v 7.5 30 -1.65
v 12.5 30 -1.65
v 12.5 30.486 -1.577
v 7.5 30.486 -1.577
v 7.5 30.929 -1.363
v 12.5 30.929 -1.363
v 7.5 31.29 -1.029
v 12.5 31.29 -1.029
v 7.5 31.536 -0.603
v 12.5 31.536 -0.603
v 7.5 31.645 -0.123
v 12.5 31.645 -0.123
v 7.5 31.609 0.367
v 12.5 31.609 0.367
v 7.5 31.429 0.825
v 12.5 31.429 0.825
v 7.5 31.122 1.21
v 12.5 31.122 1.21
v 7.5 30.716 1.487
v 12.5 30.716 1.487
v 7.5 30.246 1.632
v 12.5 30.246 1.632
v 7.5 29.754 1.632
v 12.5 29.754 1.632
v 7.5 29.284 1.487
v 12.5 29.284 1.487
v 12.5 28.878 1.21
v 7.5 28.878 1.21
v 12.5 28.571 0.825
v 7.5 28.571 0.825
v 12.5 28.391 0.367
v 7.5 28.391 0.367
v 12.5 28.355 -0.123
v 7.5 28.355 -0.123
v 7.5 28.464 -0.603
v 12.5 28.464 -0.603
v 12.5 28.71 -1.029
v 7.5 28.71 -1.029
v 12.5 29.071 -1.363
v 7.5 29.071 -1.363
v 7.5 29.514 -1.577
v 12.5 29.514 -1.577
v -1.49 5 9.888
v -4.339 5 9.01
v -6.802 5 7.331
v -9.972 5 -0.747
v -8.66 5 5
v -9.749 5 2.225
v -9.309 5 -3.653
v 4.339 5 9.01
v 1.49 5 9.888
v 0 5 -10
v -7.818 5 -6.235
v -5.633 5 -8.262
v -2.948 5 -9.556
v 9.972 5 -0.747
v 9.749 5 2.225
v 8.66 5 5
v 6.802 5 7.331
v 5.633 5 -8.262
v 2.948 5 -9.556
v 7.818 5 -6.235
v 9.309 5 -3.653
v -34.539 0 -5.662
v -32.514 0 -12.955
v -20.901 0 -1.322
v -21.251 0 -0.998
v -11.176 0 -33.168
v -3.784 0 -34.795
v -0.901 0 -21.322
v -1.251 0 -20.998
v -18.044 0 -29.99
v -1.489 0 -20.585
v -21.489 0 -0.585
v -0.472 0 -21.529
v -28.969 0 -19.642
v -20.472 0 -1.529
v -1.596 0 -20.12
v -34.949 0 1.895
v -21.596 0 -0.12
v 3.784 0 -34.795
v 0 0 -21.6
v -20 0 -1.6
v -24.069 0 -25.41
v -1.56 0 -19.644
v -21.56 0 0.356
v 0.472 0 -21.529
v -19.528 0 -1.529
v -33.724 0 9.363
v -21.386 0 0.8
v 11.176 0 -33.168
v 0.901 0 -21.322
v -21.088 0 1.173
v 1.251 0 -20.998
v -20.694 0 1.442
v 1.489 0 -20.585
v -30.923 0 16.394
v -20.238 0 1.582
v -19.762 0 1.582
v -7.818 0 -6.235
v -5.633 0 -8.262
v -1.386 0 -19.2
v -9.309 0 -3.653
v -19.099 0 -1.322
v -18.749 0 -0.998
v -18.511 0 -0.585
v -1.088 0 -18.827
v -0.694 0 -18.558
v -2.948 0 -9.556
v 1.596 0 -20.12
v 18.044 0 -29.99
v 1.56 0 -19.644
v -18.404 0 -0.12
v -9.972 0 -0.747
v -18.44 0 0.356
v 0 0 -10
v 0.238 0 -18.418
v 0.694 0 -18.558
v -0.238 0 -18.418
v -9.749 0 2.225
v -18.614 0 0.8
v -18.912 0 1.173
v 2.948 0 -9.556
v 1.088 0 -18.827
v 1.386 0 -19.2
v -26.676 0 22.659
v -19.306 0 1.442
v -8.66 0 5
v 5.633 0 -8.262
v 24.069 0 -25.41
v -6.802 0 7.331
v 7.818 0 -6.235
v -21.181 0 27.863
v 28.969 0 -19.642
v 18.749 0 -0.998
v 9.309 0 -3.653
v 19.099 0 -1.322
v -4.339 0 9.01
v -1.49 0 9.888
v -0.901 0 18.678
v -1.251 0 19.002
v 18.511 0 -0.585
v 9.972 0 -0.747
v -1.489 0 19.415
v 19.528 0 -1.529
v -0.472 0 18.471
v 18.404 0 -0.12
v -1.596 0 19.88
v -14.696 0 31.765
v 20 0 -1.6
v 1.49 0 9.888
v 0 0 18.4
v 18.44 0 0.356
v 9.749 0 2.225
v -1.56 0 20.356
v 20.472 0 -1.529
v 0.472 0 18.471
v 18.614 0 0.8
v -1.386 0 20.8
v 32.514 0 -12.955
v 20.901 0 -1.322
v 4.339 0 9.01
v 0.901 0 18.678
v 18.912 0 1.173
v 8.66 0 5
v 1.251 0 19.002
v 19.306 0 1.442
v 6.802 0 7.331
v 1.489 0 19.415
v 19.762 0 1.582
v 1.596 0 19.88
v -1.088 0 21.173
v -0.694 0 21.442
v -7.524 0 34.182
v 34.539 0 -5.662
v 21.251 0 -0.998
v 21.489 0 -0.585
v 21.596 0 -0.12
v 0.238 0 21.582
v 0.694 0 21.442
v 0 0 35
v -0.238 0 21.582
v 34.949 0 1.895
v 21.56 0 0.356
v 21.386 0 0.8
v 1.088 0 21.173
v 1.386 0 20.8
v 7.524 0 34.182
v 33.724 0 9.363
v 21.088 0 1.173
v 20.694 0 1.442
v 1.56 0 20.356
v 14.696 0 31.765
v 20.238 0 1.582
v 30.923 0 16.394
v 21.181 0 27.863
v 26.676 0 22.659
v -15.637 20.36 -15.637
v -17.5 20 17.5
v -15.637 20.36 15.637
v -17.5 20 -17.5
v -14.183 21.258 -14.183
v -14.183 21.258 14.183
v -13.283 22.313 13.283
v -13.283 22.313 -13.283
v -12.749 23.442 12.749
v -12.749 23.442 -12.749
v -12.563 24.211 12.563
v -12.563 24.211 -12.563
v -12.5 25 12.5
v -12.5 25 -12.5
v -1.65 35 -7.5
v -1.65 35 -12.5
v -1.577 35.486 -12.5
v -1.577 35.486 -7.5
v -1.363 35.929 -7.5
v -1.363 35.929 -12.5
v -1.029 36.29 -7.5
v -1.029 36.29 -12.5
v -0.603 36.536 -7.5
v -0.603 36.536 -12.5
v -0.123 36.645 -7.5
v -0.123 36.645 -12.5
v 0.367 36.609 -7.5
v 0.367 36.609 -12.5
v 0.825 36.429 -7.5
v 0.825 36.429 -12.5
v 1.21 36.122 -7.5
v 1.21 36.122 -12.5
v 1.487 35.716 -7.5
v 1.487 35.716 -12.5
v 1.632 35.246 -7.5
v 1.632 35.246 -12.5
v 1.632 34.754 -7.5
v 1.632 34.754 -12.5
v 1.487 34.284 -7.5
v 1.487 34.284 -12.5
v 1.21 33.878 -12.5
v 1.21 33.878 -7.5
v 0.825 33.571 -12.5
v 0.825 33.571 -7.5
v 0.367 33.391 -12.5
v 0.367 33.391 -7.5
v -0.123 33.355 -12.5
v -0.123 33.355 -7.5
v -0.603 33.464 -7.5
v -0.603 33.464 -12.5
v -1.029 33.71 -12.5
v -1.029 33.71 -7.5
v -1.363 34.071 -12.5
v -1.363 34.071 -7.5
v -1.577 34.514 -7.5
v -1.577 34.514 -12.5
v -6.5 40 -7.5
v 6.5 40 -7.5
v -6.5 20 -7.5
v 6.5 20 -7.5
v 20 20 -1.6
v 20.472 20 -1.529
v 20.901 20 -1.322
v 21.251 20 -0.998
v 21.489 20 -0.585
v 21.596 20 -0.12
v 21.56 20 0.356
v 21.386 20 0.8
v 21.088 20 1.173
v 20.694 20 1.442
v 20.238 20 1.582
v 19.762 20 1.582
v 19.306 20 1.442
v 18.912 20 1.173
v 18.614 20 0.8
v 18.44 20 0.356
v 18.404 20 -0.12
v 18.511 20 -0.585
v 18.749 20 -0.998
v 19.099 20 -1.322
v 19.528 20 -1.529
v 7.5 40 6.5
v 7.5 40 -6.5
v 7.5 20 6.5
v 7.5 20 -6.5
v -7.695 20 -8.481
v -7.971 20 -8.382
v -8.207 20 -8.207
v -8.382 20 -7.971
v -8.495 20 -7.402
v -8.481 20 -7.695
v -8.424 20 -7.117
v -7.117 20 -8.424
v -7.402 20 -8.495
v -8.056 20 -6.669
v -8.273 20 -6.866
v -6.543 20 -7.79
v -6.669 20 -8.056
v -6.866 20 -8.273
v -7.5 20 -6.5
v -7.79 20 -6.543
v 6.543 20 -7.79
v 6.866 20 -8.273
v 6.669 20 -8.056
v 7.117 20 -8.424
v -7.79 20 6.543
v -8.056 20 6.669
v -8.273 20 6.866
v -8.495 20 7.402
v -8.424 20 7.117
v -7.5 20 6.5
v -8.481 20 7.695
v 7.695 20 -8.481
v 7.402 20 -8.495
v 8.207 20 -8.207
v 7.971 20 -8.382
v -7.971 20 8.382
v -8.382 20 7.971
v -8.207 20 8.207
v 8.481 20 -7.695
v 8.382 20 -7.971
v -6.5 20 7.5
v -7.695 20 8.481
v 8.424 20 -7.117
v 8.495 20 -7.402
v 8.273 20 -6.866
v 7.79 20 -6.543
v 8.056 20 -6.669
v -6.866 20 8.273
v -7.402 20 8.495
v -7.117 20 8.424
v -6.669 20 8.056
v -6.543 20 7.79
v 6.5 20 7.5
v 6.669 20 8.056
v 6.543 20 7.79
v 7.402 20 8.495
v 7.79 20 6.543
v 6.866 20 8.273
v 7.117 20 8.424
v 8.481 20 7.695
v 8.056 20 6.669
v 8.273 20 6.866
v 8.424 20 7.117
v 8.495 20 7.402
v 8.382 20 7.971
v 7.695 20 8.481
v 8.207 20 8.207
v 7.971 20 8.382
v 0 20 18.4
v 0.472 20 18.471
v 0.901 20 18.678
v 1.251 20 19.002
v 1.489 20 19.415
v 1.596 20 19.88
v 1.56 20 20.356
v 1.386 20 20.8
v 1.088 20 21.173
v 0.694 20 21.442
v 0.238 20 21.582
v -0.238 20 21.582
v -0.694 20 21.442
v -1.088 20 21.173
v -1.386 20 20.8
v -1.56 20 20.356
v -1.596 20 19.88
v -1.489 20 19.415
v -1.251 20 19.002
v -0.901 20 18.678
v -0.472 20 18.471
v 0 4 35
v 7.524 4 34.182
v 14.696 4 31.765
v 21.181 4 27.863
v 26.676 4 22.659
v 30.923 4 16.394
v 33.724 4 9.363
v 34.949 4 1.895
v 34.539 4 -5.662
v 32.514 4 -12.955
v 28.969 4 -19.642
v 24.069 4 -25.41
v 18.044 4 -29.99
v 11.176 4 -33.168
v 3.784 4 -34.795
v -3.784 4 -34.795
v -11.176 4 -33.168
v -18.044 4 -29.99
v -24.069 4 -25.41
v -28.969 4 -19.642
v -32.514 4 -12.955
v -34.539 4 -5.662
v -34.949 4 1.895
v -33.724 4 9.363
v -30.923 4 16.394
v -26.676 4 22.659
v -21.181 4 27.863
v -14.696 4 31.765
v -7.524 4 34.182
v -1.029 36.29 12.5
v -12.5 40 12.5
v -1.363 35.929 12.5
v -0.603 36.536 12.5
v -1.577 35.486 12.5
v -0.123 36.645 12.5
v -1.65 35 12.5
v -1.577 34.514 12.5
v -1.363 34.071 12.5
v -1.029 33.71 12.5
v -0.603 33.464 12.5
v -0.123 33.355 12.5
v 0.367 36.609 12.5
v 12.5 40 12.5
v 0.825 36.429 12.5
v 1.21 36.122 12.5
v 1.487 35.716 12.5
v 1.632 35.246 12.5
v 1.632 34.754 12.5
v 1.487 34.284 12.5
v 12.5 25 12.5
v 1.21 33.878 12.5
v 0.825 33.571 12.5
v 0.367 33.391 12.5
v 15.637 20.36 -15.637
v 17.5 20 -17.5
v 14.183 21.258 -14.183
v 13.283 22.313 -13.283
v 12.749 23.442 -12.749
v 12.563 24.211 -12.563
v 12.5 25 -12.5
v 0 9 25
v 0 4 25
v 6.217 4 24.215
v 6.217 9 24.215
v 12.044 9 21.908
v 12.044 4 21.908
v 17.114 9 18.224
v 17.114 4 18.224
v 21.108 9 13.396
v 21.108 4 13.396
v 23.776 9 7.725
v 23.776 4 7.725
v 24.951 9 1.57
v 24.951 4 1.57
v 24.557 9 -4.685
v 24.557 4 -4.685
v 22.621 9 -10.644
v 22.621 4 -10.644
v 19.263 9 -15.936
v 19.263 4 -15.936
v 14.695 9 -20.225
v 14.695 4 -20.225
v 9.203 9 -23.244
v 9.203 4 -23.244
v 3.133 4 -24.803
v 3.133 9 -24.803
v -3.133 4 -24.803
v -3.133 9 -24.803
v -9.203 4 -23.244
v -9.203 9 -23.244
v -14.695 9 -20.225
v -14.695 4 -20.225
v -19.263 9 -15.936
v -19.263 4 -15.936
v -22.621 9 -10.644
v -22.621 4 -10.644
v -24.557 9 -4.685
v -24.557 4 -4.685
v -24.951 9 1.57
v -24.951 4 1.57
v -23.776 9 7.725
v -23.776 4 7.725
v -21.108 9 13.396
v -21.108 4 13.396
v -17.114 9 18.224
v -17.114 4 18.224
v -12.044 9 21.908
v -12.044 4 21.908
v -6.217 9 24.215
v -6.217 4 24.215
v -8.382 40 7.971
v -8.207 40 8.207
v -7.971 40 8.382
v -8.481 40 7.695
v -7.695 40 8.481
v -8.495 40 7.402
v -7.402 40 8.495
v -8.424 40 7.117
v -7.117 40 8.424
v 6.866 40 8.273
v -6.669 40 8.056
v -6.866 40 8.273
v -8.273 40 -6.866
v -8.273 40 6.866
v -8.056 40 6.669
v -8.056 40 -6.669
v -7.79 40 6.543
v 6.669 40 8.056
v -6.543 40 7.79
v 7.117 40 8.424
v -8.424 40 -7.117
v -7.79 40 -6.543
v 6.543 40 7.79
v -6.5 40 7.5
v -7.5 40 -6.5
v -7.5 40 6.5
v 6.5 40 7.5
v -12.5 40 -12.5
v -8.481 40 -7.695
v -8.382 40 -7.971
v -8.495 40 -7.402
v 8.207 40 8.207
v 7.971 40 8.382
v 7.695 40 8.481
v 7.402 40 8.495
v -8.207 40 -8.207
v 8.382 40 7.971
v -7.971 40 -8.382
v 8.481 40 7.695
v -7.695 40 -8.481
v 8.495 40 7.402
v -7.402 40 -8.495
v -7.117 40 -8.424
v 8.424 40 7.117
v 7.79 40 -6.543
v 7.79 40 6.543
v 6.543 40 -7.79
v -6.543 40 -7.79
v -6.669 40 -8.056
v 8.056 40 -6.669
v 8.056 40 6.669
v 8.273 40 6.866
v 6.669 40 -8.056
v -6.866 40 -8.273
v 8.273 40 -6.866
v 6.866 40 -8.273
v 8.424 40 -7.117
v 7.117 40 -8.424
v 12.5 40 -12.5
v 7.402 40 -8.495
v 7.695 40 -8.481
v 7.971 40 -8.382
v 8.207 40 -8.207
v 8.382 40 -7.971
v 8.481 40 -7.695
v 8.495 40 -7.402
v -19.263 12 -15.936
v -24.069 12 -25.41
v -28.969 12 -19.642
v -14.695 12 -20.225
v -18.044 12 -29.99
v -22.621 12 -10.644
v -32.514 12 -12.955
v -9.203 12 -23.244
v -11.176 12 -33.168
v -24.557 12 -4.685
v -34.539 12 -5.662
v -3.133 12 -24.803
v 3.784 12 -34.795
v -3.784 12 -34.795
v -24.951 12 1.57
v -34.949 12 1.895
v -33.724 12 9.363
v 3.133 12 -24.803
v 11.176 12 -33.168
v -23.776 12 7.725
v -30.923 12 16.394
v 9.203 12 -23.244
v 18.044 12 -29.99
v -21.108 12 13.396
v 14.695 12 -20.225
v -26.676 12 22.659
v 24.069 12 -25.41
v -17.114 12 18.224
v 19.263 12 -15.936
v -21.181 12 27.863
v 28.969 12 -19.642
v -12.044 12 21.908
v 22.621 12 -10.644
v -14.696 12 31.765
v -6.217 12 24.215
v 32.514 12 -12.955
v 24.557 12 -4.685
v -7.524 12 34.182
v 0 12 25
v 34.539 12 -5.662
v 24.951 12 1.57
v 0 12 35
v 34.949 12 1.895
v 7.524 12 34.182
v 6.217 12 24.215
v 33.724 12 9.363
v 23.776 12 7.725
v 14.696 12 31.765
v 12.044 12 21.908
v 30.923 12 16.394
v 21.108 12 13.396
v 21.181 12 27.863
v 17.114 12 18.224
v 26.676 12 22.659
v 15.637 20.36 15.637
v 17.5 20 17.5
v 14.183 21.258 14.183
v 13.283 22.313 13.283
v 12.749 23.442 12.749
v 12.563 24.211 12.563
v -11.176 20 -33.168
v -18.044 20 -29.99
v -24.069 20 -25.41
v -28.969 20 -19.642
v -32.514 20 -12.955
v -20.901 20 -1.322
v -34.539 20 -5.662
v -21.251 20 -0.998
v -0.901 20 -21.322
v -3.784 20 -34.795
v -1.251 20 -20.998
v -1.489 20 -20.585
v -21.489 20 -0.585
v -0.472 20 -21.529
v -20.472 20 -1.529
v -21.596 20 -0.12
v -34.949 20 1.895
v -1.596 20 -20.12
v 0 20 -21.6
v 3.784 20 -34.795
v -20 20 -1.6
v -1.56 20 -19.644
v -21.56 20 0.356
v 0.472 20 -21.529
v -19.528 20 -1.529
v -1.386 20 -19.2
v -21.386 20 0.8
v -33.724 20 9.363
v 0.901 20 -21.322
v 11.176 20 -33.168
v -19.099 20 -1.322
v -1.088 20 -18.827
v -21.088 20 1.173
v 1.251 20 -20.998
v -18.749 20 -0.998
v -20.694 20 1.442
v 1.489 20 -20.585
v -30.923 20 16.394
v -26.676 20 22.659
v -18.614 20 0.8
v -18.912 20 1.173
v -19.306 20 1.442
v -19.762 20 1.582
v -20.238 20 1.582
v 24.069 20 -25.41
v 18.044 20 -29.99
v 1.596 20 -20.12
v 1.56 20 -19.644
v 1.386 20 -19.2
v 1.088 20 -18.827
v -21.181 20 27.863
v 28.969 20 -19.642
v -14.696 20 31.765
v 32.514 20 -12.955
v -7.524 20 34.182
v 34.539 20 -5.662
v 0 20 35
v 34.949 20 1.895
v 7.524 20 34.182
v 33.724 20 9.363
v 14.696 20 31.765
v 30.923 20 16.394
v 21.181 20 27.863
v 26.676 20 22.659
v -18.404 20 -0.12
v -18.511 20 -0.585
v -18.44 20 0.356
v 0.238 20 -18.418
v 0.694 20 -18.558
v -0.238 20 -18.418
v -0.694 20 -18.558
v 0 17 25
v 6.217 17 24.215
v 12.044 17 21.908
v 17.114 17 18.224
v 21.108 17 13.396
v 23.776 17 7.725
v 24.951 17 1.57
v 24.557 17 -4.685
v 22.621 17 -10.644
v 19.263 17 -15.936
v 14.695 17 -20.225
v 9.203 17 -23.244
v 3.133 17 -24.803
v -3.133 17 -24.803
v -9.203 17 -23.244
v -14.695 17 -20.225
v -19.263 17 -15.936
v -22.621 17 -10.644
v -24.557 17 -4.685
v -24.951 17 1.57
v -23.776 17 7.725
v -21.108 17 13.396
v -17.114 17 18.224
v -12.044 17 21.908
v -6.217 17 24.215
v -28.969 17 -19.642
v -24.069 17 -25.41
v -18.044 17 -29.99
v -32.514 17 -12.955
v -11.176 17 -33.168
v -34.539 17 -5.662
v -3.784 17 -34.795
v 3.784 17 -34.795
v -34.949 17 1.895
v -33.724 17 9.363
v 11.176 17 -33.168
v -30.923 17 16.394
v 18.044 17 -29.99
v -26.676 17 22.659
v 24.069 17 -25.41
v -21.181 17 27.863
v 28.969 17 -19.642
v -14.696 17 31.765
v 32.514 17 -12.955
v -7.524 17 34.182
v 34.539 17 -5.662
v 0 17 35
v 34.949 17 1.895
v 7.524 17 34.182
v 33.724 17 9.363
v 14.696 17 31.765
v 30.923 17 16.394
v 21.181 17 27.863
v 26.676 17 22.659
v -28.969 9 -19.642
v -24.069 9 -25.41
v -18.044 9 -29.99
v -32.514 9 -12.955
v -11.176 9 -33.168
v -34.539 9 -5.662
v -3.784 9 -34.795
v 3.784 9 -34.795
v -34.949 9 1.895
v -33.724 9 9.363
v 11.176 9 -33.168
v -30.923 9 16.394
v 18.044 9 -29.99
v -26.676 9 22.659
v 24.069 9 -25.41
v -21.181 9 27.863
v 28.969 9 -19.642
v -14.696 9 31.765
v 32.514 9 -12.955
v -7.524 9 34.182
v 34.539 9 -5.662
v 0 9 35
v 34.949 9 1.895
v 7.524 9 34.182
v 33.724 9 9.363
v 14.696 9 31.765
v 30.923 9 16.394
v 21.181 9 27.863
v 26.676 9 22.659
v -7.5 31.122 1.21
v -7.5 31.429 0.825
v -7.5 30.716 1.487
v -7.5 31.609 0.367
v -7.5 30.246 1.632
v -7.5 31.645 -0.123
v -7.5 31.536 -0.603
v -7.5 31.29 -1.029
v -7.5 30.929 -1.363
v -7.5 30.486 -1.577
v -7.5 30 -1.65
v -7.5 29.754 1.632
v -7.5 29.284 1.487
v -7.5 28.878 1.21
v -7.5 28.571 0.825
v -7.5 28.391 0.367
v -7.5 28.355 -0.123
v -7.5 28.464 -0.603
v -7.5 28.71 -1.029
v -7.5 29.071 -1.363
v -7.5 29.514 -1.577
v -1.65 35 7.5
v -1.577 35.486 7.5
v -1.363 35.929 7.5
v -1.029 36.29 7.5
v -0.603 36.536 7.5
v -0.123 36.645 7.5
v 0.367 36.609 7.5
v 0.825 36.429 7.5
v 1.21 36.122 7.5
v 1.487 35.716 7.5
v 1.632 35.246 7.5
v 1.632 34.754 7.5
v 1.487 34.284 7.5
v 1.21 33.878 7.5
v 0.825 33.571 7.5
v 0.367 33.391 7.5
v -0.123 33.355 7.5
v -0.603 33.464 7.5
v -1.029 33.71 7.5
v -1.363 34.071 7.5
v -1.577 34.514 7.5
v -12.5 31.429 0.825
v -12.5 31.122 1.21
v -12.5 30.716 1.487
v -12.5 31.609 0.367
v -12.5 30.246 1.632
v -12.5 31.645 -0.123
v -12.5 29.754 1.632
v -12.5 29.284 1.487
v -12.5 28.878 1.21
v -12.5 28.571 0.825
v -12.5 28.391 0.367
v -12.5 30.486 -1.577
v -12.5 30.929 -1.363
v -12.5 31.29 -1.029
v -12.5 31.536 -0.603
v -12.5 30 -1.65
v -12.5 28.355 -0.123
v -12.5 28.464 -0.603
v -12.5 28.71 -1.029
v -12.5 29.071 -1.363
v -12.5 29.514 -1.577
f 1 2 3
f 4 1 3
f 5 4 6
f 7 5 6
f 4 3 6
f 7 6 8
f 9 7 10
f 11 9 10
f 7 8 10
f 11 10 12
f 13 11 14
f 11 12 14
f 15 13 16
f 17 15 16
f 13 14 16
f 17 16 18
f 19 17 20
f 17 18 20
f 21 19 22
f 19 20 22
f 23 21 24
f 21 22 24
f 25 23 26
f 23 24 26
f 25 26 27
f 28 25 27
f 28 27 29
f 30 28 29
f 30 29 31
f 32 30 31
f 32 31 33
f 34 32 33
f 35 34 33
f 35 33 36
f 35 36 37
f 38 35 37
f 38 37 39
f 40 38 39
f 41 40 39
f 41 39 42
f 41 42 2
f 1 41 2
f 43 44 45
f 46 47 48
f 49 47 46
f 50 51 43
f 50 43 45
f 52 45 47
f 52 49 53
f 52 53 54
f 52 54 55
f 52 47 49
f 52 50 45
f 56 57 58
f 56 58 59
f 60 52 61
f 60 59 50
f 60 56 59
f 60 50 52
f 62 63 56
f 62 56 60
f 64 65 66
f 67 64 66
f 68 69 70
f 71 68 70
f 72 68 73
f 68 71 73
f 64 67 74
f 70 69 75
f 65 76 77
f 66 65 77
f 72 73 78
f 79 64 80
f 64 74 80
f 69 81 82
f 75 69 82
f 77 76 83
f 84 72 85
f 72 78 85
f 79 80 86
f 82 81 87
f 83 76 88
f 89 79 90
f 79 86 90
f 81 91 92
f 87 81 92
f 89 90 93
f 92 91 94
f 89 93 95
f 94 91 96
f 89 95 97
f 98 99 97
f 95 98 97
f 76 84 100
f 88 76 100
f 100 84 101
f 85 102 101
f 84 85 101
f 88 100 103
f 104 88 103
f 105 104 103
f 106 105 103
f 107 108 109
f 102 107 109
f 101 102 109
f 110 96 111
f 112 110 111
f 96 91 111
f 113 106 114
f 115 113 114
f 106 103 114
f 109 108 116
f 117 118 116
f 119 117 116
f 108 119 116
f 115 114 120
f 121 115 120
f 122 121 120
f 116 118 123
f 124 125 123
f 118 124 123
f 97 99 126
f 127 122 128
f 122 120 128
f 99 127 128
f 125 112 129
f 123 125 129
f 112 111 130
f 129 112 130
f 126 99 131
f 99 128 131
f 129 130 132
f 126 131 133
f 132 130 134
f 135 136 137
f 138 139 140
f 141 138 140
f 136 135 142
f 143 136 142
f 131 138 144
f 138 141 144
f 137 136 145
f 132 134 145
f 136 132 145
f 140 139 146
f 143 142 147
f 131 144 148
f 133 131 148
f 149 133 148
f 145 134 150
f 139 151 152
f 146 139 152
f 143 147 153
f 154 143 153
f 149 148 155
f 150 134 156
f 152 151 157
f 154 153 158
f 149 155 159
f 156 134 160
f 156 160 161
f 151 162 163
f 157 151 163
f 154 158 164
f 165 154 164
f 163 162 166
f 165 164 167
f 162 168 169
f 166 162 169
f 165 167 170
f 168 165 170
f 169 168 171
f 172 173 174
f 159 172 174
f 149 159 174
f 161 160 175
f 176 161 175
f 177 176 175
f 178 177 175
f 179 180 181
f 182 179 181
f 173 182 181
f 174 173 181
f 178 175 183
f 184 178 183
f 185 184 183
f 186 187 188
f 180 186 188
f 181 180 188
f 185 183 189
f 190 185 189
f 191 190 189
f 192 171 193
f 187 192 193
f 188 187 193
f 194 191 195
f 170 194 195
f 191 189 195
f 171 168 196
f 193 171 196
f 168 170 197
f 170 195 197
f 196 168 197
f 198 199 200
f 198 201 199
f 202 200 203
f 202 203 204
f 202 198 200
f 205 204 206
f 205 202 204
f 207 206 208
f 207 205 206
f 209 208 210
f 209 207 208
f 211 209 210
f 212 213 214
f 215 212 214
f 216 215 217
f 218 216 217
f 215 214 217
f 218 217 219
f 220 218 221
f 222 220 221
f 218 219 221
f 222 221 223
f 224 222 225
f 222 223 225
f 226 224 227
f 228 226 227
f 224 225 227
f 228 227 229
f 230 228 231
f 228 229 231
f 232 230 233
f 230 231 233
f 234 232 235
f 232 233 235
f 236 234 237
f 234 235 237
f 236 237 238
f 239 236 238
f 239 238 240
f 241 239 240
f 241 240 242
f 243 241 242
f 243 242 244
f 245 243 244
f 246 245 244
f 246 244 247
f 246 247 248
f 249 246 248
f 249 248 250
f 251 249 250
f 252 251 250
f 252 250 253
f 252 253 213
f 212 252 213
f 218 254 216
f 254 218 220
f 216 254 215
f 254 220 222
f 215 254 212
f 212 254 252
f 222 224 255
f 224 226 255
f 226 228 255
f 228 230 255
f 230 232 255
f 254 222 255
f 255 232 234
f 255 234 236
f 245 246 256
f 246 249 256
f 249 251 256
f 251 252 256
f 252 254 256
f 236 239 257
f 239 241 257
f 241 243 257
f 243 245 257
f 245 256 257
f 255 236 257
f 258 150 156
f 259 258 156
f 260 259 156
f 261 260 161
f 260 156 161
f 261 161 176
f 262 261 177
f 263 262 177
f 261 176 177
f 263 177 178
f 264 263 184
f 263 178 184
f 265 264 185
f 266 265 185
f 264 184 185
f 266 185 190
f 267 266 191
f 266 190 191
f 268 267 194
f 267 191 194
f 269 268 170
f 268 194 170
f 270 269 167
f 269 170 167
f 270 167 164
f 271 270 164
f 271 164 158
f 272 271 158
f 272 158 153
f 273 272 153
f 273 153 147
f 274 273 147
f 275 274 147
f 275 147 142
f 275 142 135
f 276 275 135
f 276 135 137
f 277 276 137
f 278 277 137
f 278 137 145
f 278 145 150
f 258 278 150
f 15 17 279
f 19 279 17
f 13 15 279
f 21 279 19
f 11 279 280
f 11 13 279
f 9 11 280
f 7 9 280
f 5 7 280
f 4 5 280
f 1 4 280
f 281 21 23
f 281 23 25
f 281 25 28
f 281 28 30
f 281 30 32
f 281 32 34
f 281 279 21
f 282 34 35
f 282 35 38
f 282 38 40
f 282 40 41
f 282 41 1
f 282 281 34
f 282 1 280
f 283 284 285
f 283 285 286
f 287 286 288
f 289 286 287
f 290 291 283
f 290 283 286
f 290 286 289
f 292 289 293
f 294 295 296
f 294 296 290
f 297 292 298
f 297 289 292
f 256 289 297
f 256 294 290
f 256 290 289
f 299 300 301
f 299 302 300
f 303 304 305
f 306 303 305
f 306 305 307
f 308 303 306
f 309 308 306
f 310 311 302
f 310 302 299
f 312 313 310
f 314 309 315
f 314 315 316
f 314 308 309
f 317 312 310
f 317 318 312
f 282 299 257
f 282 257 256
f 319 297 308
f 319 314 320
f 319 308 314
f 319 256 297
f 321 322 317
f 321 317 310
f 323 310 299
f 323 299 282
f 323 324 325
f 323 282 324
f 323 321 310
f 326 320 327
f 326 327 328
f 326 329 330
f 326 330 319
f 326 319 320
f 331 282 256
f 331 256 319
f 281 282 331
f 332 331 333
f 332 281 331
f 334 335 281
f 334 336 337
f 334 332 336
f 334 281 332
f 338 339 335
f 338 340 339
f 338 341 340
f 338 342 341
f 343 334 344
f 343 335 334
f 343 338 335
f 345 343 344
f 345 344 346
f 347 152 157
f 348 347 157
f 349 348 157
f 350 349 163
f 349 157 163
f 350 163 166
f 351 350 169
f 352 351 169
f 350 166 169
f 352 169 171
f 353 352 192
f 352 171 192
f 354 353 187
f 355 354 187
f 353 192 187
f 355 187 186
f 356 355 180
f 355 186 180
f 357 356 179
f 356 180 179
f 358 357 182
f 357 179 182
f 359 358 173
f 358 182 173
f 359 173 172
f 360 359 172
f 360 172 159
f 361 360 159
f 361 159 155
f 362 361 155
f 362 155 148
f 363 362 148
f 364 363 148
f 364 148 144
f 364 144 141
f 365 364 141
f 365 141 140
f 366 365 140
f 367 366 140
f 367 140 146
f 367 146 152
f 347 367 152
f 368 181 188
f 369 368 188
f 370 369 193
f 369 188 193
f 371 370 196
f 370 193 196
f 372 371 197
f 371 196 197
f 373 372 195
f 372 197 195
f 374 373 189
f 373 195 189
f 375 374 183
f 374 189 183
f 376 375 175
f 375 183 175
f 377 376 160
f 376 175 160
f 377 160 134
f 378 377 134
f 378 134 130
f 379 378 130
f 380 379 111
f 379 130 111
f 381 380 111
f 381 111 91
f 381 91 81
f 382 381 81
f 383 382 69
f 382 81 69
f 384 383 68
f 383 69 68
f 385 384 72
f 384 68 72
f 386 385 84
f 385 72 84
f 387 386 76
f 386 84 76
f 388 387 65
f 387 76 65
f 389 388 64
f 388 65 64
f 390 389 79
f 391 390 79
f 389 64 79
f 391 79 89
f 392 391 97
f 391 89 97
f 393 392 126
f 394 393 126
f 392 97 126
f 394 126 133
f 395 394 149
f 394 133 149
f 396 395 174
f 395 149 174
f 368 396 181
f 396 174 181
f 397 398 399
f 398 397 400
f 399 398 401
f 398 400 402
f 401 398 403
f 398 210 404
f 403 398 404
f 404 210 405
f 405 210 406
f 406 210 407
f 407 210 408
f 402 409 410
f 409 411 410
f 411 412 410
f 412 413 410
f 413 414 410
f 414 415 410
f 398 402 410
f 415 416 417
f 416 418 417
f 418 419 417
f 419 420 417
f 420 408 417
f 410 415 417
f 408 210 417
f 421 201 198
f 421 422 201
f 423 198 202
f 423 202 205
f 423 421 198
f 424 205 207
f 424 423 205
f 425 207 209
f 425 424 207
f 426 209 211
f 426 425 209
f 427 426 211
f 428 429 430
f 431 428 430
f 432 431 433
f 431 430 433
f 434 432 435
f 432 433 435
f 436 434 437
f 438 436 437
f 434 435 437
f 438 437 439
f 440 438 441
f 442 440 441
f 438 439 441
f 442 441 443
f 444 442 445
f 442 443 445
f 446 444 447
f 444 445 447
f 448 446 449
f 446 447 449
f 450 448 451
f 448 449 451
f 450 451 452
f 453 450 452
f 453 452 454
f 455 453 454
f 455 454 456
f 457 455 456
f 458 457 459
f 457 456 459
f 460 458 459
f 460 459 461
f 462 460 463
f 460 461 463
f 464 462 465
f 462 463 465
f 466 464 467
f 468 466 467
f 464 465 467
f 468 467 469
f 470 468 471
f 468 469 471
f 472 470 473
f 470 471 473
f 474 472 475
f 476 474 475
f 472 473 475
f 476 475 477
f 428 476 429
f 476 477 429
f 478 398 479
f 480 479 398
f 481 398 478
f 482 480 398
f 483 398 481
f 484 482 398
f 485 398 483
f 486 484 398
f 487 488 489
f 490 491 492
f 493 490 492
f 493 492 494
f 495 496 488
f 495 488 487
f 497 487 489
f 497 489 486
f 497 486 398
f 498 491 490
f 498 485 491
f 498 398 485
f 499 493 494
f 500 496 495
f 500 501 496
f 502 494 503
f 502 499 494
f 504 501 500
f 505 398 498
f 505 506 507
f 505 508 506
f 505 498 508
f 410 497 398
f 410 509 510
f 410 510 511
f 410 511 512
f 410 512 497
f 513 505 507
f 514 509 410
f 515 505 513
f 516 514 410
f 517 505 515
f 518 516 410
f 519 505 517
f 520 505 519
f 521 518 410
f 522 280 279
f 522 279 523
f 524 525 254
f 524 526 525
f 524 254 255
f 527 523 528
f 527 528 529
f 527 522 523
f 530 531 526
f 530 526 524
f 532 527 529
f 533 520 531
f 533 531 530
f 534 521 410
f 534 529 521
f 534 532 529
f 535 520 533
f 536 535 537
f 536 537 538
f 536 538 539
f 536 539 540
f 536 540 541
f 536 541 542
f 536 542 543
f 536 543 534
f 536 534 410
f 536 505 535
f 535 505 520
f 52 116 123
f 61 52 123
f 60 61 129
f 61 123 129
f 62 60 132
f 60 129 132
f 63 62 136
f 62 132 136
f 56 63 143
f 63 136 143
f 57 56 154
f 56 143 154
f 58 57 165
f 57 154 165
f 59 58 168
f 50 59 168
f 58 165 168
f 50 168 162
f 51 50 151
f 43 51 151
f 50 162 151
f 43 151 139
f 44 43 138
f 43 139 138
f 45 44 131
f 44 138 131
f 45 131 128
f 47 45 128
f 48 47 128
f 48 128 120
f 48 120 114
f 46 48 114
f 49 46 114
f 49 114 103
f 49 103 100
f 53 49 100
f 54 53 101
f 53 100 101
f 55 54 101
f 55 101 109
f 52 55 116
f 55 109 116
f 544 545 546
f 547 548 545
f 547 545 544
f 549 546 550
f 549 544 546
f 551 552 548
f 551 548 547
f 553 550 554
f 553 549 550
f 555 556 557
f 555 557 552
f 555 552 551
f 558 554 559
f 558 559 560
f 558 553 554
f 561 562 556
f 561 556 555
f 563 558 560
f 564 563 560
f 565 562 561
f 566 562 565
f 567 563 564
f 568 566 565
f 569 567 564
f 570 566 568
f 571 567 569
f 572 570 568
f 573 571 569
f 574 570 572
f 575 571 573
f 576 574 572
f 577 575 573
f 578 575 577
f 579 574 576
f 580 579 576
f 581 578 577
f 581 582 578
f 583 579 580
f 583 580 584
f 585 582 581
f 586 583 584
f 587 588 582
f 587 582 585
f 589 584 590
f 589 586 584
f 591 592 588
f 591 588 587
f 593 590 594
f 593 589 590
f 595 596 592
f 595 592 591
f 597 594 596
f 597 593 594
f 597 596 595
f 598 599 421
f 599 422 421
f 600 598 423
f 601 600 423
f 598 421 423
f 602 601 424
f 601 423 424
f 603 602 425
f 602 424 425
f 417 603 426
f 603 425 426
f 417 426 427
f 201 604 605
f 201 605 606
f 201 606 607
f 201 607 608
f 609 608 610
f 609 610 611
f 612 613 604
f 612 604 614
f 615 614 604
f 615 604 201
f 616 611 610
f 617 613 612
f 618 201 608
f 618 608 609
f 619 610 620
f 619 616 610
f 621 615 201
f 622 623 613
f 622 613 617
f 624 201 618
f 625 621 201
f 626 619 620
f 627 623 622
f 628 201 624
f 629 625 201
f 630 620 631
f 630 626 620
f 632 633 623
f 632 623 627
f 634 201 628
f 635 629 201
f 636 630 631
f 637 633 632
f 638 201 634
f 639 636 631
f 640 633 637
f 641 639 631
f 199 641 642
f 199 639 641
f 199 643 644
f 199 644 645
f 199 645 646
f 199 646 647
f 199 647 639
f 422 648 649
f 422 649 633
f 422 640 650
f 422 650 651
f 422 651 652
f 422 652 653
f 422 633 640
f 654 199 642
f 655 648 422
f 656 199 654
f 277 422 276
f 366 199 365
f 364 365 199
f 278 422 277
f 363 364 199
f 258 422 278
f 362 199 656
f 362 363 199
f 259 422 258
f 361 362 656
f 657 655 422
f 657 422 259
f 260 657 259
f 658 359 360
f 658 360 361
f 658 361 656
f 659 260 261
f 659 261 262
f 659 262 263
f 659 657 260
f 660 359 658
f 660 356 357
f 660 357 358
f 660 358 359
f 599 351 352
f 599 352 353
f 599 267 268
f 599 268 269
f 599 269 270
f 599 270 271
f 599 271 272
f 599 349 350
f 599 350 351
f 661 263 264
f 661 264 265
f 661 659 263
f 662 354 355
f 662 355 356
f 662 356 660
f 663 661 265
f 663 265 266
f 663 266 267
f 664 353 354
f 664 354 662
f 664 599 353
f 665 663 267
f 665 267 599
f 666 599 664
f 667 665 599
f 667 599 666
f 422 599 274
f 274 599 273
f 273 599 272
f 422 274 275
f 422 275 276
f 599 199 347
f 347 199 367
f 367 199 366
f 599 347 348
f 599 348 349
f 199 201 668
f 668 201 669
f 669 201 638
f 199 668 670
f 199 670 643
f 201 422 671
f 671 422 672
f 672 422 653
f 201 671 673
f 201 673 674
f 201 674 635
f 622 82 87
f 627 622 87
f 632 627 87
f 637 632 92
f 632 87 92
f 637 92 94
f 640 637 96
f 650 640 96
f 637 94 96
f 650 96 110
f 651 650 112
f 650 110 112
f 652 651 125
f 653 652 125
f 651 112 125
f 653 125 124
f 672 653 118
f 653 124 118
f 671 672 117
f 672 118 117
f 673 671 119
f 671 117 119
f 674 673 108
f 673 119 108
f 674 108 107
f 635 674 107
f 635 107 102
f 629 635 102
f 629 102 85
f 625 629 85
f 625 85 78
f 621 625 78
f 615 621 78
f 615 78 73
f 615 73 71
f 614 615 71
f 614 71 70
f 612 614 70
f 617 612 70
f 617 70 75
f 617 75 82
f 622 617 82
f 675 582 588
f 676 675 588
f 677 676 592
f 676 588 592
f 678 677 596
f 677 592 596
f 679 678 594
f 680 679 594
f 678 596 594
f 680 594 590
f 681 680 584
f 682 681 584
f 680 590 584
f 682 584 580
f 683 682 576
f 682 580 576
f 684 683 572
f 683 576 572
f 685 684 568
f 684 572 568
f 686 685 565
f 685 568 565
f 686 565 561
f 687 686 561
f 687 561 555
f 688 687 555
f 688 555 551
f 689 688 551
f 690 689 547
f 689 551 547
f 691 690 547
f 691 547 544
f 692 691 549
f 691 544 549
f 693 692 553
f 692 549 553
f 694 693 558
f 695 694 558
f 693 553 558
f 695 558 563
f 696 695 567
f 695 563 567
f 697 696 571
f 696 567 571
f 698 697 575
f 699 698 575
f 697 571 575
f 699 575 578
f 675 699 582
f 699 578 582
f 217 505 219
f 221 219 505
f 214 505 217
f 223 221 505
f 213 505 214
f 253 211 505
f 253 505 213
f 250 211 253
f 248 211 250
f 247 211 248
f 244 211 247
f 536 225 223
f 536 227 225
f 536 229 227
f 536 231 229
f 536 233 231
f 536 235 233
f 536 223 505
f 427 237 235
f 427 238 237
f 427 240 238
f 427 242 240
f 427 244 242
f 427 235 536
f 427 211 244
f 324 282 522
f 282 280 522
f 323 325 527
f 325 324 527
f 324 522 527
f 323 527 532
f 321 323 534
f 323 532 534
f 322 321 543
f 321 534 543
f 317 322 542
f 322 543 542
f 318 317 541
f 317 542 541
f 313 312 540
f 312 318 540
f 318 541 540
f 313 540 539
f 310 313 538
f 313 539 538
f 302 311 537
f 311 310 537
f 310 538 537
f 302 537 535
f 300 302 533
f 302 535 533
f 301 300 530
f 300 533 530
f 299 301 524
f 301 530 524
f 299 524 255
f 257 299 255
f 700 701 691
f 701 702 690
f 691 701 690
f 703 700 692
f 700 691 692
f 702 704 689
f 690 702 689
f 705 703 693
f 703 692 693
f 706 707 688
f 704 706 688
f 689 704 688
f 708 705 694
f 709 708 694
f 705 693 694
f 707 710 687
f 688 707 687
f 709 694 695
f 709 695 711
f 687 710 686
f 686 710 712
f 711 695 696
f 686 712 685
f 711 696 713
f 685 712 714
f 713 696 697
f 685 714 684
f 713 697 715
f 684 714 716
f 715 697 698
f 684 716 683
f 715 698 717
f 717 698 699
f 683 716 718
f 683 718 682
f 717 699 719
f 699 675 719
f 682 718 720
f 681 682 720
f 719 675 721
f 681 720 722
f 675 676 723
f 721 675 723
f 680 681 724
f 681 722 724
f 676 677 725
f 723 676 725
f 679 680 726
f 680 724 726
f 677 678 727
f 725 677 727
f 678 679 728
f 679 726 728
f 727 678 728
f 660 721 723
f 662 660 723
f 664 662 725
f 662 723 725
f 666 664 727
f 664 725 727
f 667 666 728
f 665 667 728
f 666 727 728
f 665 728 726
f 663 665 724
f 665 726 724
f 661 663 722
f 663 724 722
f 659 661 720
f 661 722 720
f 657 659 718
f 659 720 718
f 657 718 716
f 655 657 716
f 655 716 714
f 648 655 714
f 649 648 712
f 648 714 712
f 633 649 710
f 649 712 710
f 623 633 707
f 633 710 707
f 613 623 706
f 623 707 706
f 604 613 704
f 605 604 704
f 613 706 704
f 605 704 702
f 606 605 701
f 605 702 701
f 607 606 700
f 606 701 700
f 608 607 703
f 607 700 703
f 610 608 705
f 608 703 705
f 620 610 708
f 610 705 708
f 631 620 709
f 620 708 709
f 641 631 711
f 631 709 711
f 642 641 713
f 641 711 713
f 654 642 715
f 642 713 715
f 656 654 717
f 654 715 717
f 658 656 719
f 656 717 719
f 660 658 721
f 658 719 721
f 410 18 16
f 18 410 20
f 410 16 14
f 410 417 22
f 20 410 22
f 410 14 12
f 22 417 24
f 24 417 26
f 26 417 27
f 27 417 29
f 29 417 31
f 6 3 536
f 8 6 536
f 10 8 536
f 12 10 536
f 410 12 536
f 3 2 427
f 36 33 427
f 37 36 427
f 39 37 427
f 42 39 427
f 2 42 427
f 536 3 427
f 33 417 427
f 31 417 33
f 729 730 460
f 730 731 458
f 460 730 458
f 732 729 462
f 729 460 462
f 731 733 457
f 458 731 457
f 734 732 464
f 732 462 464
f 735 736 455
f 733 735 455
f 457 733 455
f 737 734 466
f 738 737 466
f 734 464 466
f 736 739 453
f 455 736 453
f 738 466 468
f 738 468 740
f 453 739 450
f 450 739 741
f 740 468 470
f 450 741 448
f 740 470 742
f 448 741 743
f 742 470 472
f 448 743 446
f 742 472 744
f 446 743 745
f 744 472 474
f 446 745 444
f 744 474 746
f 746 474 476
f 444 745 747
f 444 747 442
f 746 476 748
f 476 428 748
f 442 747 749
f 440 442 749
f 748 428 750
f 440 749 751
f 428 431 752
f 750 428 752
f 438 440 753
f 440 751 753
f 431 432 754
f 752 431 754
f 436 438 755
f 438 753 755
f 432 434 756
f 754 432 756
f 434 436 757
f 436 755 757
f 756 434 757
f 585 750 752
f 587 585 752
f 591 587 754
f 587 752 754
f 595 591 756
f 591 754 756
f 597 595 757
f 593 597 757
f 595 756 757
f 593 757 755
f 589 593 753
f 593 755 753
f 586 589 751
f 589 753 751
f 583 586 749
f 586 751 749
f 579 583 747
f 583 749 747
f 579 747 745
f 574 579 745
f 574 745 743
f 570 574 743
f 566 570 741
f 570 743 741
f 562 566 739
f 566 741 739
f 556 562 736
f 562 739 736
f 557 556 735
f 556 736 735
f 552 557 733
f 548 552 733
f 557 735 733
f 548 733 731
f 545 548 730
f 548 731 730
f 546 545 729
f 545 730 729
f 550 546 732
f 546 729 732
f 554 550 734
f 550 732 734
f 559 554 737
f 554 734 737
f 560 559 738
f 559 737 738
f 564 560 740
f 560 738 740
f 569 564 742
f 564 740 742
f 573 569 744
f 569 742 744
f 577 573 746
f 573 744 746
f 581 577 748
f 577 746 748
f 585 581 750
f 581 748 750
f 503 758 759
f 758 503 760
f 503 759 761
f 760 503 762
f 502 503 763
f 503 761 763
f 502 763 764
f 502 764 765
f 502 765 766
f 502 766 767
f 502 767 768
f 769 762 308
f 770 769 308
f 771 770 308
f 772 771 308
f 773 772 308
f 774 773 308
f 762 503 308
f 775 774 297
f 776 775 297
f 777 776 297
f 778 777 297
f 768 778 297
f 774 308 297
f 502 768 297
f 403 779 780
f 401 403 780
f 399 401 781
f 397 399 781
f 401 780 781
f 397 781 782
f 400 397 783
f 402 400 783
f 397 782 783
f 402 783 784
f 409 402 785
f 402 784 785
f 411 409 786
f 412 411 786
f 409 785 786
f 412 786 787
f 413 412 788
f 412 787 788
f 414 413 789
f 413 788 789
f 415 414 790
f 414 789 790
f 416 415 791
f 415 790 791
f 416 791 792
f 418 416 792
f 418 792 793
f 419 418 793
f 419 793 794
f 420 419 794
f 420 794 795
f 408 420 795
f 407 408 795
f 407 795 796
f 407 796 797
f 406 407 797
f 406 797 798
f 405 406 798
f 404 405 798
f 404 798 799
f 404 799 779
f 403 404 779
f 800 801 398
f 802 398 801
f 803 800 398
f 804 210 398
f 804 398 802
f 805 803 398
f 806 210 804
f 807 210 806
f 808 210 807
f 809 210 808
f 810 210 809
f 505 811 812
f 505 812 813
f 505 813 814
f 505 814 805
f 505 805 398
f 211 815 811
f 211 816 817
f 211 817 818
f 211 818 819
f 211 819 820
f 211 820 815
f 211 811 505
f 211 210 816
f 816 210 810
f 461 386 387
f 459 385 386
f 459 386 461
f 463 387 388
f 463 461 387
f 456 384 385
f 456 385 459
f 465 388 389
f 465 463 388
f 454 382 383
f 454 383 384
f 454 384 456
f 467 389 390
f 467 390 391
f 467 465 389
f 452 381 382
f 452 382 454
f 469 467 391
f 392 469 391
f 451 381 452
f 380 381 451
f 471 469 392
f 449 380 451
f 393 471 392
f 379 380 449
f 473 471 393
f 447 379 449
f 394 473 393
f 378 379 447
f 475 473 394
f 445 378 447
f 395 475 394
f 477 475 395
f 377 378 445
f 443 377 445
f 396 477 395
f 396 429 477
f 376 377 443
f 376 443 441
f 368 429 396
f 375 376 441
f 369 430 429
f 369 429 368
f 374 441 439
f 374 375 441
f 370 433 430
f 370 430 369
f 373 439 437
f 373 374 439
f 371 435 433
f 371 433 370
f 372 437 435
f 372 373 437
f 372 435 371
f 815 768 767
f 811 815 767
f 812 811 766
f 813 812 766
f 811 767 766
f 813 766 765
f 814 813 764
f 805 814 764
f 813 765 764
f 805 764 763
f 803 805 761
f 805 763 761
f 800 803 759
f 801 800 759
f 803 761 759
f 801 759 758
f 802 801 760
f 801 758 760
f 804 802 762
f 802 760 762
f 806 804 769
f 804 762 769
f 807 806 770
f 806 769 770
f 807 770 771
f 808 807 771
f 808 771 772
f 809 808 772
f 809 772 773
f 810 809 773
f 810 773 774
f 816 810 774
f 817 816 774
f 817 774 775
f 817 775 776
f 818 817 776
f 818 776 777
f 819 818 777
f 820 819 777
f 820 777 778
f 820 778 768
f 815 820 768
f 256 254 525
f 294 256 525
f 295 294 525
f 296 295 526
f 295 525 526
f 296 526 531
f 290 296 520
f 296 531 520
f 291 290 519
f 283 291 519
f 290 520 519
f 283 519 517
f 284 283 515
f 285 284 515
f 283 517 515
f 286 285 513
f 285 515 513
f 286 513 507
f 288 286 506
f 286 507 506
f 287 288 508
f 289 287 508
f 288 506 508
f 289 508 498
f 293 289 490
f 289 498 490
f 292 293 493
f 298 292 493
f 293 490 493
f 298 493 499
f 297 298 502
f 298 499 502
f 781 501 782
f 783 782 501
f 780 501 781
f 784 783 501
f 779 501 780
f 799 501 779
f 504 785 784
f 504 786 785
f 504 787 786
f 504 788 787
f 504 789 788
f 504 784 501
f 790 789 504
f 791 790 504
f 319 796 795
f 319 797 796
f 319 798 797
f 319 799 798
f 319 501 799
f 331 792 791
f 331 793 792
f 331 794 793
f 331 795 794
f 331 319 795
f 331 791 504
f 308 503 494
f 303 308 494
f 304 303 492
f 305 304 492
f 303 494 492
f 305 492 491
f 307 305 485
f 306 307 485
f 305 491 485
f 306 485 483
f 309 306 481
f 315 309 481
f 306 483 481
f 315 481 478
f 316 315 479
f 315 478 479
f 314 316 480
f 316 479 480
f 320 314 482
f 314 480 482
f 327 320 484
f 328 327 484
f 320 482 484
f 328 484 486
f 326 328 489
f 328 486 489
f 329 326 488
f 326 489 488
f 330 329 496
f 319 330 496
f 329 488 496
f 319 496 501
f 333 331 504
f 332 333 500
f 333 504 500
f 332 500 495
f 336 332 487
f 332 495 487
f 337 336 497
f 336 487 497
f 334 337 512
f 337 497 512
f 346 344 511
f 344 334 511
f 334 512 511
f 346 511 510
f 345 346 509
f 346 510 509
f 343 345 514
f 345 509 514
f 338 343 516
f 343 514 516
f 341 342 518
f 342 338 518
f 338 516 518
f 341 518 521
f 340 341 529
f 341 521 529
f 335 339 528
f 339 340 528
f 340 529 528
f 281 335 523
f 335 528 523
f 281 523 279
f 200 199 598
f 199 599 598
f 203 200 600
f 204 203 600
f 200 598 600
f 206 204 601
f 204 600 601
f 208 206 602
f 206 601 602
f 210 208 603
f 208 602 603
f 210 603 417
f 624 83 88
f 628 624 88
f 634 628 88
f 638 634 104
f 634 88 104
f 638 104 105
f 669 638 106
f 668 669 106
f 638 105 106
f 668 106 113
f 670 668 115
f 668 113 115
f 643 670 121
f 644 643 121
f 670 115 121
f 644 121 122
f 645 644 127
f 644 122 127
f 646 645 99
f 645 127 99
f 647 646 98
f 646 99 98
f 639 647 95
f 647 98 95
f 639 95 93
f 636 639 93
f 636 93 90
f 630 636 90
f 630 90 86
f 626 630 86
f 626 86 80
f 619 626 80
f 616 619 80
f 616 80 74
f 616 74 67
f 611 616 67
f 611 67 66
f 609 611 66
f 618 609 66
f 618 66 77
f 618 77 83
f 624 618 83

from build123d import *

# Parameters (mm, degrees)
SKETCH_1_R          = 35
EXTRUDE_1_DEPTH     = 4
SKETCH_2_R          = 25
EXTRUDE_2_DEPTH     = 5
SKETCH_3_R          = 35
EXTRUDE_3_DEPTH     = 3
SKETCH_4_R          = 25
EXTRUDE_4_DEPTH     = 5
SKETCH_5_R          = 35
EXTRUDE_5_DEPTH     = 3
CUT_EXTRUDE_1_REACH = 55.385
SKETCH_6_R          = 1.6
SKETCH_7_R          = 10
CUT_EXTRUDE_2_DEPTH = 5
SKETCH_10_W         = 25
SKETCH_10_H         = 25
SKETCH_10_W_2       = 15
SKETCH_10_H_2       = 15
EXTRUDE_6_DEPTH     = 20
SKETCH_12_R         = 1
CUT_EXTRUDE_5_DEPTH = 20
FILLET_1_R          = 5
SKETCH_13_R         = 1.65
CUT_EXTRUDE_6_DEPTH = 72.282887147
SKETCH_14_R         = 1.65
CUT_EXTRUDE_7_DEPTH = 72.282887147


with BuildPart() as part:
    # 草图1 → 凸台-拉伸1 (new body)
    with BuildSketch(Plane(origin=(0, 0, 0), x_dir=(1, 0, 0), z_dir=(0, 1, 0))):
        with Locations(Location((0, 0, 0), (0, 0, 270))):
            Circle(SKETCH_1_R)
    extrude(amount=EXTRUDE_1_DEPTH)

    # 草图2 → 凸台-拉伸2 (add)
    with BuildSketch(Plane(origin=(0, 4, 0), x_dir=(1, 0, 0), z_dir=(0, 1, 0))):
        with Locations(Location((0, 0, 0), (0, 0, 270))):
            Circle(SKETCH_2_R)
    extrude(amount=EXTRUDE_2_DEPTH)

    # 草图3 → 凸台-拉伸3 (add)
    with BuildSketch(Plane(origin=(0, 9, 0), x_dir=(1, 0, 0), z_dir=(0, 1, 0))):
        with Locations(Location((0, 0, 0), (0, 0, 270))):
            Circle(SKETCH_3_R)
    extrude(amount=EXTRUDE_3_DEPTH)

    # 草图4 → 凸台-拉伸4 (add)
    with BuildSketch(Plane(origin=(0, 12, 0), x_dir=(1, 0, 0), z_dir=(0, 1, 0))):
        with Locations(Location((0, 0, 0), (0, 0, 270))):
            Circle(SKETCH_4_R)
    extrude(amount=EXTRUDE_4_DEPTH)

    # 草图5 → 凸台-拉伸5 (add)
    with BuildSketch(Plane(origin=(0, 17, 0), x_dir=(1, 0, 0), z_dir=(0, 1, 0))):
        with Locations(Location((0, 0, 0), (0, 0, 270))):
            Circle(SKETCH_5_R)
    extrude(amount=EXTRUDE_5_DEPTH)

    # 草图6 → 切除-拉伸1 (cut, up to next)
    with BuildSketch(Plane.XZ, mode=Mode.PRIVATE) as cut_extrude_1_sk1:
        with Locations(Location((-20, 0, 0), (0, 0, 270))):
            Circle(SKETCH_6_R)
    cut_extrude_1_tool1 = extrude(cut_extrude_1_sk1.sketch, amount=-CUT_EXTRUDE_1_REACH, mode=Mode.PRIVATE) & part.part
    # 草图6 → 切除-拉伸1 (cut, up to next)
    with BuildSketch(Plane.XZ, mode=Mode.PRIVATE) as cut_extrude_1_sk2:
        with Locations(Location((0, 20, 0), (0, 0, 270))):
            Circle(SKETCH_6_R)
    cut_extrude_1_tool2 = extrude(cut_extrude_1_sk2.sketch, amount=-CUT_EXTRUDE_1_REACH, mode=Mode.PRIVATE) & part.part
    # 草图6 → 切除-拉伸1 (cut, up to next)
    with BuildSketch(Plane.XZ, mode=Mode.PRIVATE) as cut_extrude_1_sk3:
        with Locations(Location((0, -20, 0), (0, 0, 270))):
            Circle(SKETCH_6_R)
    cut_extrude_1_tool3 = extrude(cut_extrude_1_sk3.sketch, amount=-CUT_EXTRUDE_1_REACH, mode=Mode.PRIVATE) & part.part
    # 草图6 → 切除-拉伸1 (cut, up to next)
    with BuildSketch(Plane.XZ, mode=Mode.PRIVATE) as cut_extrude_1_sk4:
        with Locations(Location((20, 0, 0), (0, 0, 270))):
            Circle(SKETCH_6_R)
    cut_extrude_1_tool4 = extrude(cut_extrude_1_sk4.sketch, amount=-CUT_EXTRUDE_1_REACH, mode=Mode.PRIVATE) & part.part
    add(cut_extrude_1_tool1.solids().sort_by_distance((-20, 0, 0))[0], mode=Mode.SUBTRACT)
    add(cut_extrude_1_tool2.solids().sort_by_distance((0, 0, 20))[0], mode=Mode.SUBTRACT)
    add(cut_extrude_1_tool3.solids().sort_by_distance((0, 0, -20))[0], mode=Mode.SUBTRACT)
    add(cut_extrude_1_tool4.solids().sort_by_distance((20, 0, 0))[0], mode=Mode.SUBTRACT)

    # 草图7 → 切除-拉伸2 (cut)
    with BuildSketch(Plane.XZ):
        with Locations(Location((0, 0, 0), (0, 0, 270))):
            Circle(SKETCH_7_R)
    extrude(amount=-CUT_EXTRUDE_2_DEPTH, mode=Mode.SUBTRACT)

    # 草图10 → 凸台-拉伸6 (add)
    with BuildSketch(Plane(origin=(0, 20, 0), x_dir=(1, 0, 0), z_dir=(0, 1, 0))):
        Rectangle(SKETCH_10_W, SKETCH_10_H)
        Rectangle(SKETCH_10_W_2, SKETCH_10_H_2, mode=Mode.SUBTRACT)
    extrude(amount=EXTRUDE_6_DEPTH)

    # 草图12 → 切除-拉伸5 (cut)
    with BuildSketch(Plane(origin=(0, 40, 0), x_dir=(1, 0, 0), z_dir=(0, 1, 0))):
        with Locations((7.5, 7.5)):
            Circle(SKETCH_12_R)
        with Locations((-7.5, 7.5)):
            Circle(SKETCH_12_R)
        with Locations((-7.5, -7.5)):
            Circle(SKETCH_12_R)
        with Locations((7.5, -7.5)):
            Circle(SKETCH_12_R)
    extrude(amount=-CUT_EXTRUDE_5_DEPTH, mode=Mode.SUBTRACT)

    # 圆角1
    fillet_1_edges = [part.edges().sort_by_distance(p)[0] for p in [
        (12.5, 20, 0),
        (0, 20, -12.5),
        (-12.5, 20, 0),
        (0, 20, 12.5),
    ]]
    fillet(fillet_1_edges, radius=FILLET_1_R)

    # 草图13 → 切除-拉伸6 (cut, through all)
    with BuildSketch(Plane(origin=(12.5, 0, 0), x_dir=(0, 0, -1), z_dir=(1, 0, 0))):
        with Locations((0, 30)):
            Circle(SKETCH_13_R)
    extrude(amount=-CUT_EXTRUDE_6_DEPTH, mode=Mode.SUBTRACT)

    # 草图14 → 切除-拉伸7 (cut, through all)
    with BuildSketch(Plane(origin=(0, 0, -12.5), x_dir=(-1, 0, 0), z_dir=(0, 0, -1))):
        with Locations((0, 35)):
            Circle(SKETCH_14_R)
    extrude(amount=-CUT_EXTRUDE_7_DEPTH, mode=Mode.SUBTRACT)


solid = part.part
